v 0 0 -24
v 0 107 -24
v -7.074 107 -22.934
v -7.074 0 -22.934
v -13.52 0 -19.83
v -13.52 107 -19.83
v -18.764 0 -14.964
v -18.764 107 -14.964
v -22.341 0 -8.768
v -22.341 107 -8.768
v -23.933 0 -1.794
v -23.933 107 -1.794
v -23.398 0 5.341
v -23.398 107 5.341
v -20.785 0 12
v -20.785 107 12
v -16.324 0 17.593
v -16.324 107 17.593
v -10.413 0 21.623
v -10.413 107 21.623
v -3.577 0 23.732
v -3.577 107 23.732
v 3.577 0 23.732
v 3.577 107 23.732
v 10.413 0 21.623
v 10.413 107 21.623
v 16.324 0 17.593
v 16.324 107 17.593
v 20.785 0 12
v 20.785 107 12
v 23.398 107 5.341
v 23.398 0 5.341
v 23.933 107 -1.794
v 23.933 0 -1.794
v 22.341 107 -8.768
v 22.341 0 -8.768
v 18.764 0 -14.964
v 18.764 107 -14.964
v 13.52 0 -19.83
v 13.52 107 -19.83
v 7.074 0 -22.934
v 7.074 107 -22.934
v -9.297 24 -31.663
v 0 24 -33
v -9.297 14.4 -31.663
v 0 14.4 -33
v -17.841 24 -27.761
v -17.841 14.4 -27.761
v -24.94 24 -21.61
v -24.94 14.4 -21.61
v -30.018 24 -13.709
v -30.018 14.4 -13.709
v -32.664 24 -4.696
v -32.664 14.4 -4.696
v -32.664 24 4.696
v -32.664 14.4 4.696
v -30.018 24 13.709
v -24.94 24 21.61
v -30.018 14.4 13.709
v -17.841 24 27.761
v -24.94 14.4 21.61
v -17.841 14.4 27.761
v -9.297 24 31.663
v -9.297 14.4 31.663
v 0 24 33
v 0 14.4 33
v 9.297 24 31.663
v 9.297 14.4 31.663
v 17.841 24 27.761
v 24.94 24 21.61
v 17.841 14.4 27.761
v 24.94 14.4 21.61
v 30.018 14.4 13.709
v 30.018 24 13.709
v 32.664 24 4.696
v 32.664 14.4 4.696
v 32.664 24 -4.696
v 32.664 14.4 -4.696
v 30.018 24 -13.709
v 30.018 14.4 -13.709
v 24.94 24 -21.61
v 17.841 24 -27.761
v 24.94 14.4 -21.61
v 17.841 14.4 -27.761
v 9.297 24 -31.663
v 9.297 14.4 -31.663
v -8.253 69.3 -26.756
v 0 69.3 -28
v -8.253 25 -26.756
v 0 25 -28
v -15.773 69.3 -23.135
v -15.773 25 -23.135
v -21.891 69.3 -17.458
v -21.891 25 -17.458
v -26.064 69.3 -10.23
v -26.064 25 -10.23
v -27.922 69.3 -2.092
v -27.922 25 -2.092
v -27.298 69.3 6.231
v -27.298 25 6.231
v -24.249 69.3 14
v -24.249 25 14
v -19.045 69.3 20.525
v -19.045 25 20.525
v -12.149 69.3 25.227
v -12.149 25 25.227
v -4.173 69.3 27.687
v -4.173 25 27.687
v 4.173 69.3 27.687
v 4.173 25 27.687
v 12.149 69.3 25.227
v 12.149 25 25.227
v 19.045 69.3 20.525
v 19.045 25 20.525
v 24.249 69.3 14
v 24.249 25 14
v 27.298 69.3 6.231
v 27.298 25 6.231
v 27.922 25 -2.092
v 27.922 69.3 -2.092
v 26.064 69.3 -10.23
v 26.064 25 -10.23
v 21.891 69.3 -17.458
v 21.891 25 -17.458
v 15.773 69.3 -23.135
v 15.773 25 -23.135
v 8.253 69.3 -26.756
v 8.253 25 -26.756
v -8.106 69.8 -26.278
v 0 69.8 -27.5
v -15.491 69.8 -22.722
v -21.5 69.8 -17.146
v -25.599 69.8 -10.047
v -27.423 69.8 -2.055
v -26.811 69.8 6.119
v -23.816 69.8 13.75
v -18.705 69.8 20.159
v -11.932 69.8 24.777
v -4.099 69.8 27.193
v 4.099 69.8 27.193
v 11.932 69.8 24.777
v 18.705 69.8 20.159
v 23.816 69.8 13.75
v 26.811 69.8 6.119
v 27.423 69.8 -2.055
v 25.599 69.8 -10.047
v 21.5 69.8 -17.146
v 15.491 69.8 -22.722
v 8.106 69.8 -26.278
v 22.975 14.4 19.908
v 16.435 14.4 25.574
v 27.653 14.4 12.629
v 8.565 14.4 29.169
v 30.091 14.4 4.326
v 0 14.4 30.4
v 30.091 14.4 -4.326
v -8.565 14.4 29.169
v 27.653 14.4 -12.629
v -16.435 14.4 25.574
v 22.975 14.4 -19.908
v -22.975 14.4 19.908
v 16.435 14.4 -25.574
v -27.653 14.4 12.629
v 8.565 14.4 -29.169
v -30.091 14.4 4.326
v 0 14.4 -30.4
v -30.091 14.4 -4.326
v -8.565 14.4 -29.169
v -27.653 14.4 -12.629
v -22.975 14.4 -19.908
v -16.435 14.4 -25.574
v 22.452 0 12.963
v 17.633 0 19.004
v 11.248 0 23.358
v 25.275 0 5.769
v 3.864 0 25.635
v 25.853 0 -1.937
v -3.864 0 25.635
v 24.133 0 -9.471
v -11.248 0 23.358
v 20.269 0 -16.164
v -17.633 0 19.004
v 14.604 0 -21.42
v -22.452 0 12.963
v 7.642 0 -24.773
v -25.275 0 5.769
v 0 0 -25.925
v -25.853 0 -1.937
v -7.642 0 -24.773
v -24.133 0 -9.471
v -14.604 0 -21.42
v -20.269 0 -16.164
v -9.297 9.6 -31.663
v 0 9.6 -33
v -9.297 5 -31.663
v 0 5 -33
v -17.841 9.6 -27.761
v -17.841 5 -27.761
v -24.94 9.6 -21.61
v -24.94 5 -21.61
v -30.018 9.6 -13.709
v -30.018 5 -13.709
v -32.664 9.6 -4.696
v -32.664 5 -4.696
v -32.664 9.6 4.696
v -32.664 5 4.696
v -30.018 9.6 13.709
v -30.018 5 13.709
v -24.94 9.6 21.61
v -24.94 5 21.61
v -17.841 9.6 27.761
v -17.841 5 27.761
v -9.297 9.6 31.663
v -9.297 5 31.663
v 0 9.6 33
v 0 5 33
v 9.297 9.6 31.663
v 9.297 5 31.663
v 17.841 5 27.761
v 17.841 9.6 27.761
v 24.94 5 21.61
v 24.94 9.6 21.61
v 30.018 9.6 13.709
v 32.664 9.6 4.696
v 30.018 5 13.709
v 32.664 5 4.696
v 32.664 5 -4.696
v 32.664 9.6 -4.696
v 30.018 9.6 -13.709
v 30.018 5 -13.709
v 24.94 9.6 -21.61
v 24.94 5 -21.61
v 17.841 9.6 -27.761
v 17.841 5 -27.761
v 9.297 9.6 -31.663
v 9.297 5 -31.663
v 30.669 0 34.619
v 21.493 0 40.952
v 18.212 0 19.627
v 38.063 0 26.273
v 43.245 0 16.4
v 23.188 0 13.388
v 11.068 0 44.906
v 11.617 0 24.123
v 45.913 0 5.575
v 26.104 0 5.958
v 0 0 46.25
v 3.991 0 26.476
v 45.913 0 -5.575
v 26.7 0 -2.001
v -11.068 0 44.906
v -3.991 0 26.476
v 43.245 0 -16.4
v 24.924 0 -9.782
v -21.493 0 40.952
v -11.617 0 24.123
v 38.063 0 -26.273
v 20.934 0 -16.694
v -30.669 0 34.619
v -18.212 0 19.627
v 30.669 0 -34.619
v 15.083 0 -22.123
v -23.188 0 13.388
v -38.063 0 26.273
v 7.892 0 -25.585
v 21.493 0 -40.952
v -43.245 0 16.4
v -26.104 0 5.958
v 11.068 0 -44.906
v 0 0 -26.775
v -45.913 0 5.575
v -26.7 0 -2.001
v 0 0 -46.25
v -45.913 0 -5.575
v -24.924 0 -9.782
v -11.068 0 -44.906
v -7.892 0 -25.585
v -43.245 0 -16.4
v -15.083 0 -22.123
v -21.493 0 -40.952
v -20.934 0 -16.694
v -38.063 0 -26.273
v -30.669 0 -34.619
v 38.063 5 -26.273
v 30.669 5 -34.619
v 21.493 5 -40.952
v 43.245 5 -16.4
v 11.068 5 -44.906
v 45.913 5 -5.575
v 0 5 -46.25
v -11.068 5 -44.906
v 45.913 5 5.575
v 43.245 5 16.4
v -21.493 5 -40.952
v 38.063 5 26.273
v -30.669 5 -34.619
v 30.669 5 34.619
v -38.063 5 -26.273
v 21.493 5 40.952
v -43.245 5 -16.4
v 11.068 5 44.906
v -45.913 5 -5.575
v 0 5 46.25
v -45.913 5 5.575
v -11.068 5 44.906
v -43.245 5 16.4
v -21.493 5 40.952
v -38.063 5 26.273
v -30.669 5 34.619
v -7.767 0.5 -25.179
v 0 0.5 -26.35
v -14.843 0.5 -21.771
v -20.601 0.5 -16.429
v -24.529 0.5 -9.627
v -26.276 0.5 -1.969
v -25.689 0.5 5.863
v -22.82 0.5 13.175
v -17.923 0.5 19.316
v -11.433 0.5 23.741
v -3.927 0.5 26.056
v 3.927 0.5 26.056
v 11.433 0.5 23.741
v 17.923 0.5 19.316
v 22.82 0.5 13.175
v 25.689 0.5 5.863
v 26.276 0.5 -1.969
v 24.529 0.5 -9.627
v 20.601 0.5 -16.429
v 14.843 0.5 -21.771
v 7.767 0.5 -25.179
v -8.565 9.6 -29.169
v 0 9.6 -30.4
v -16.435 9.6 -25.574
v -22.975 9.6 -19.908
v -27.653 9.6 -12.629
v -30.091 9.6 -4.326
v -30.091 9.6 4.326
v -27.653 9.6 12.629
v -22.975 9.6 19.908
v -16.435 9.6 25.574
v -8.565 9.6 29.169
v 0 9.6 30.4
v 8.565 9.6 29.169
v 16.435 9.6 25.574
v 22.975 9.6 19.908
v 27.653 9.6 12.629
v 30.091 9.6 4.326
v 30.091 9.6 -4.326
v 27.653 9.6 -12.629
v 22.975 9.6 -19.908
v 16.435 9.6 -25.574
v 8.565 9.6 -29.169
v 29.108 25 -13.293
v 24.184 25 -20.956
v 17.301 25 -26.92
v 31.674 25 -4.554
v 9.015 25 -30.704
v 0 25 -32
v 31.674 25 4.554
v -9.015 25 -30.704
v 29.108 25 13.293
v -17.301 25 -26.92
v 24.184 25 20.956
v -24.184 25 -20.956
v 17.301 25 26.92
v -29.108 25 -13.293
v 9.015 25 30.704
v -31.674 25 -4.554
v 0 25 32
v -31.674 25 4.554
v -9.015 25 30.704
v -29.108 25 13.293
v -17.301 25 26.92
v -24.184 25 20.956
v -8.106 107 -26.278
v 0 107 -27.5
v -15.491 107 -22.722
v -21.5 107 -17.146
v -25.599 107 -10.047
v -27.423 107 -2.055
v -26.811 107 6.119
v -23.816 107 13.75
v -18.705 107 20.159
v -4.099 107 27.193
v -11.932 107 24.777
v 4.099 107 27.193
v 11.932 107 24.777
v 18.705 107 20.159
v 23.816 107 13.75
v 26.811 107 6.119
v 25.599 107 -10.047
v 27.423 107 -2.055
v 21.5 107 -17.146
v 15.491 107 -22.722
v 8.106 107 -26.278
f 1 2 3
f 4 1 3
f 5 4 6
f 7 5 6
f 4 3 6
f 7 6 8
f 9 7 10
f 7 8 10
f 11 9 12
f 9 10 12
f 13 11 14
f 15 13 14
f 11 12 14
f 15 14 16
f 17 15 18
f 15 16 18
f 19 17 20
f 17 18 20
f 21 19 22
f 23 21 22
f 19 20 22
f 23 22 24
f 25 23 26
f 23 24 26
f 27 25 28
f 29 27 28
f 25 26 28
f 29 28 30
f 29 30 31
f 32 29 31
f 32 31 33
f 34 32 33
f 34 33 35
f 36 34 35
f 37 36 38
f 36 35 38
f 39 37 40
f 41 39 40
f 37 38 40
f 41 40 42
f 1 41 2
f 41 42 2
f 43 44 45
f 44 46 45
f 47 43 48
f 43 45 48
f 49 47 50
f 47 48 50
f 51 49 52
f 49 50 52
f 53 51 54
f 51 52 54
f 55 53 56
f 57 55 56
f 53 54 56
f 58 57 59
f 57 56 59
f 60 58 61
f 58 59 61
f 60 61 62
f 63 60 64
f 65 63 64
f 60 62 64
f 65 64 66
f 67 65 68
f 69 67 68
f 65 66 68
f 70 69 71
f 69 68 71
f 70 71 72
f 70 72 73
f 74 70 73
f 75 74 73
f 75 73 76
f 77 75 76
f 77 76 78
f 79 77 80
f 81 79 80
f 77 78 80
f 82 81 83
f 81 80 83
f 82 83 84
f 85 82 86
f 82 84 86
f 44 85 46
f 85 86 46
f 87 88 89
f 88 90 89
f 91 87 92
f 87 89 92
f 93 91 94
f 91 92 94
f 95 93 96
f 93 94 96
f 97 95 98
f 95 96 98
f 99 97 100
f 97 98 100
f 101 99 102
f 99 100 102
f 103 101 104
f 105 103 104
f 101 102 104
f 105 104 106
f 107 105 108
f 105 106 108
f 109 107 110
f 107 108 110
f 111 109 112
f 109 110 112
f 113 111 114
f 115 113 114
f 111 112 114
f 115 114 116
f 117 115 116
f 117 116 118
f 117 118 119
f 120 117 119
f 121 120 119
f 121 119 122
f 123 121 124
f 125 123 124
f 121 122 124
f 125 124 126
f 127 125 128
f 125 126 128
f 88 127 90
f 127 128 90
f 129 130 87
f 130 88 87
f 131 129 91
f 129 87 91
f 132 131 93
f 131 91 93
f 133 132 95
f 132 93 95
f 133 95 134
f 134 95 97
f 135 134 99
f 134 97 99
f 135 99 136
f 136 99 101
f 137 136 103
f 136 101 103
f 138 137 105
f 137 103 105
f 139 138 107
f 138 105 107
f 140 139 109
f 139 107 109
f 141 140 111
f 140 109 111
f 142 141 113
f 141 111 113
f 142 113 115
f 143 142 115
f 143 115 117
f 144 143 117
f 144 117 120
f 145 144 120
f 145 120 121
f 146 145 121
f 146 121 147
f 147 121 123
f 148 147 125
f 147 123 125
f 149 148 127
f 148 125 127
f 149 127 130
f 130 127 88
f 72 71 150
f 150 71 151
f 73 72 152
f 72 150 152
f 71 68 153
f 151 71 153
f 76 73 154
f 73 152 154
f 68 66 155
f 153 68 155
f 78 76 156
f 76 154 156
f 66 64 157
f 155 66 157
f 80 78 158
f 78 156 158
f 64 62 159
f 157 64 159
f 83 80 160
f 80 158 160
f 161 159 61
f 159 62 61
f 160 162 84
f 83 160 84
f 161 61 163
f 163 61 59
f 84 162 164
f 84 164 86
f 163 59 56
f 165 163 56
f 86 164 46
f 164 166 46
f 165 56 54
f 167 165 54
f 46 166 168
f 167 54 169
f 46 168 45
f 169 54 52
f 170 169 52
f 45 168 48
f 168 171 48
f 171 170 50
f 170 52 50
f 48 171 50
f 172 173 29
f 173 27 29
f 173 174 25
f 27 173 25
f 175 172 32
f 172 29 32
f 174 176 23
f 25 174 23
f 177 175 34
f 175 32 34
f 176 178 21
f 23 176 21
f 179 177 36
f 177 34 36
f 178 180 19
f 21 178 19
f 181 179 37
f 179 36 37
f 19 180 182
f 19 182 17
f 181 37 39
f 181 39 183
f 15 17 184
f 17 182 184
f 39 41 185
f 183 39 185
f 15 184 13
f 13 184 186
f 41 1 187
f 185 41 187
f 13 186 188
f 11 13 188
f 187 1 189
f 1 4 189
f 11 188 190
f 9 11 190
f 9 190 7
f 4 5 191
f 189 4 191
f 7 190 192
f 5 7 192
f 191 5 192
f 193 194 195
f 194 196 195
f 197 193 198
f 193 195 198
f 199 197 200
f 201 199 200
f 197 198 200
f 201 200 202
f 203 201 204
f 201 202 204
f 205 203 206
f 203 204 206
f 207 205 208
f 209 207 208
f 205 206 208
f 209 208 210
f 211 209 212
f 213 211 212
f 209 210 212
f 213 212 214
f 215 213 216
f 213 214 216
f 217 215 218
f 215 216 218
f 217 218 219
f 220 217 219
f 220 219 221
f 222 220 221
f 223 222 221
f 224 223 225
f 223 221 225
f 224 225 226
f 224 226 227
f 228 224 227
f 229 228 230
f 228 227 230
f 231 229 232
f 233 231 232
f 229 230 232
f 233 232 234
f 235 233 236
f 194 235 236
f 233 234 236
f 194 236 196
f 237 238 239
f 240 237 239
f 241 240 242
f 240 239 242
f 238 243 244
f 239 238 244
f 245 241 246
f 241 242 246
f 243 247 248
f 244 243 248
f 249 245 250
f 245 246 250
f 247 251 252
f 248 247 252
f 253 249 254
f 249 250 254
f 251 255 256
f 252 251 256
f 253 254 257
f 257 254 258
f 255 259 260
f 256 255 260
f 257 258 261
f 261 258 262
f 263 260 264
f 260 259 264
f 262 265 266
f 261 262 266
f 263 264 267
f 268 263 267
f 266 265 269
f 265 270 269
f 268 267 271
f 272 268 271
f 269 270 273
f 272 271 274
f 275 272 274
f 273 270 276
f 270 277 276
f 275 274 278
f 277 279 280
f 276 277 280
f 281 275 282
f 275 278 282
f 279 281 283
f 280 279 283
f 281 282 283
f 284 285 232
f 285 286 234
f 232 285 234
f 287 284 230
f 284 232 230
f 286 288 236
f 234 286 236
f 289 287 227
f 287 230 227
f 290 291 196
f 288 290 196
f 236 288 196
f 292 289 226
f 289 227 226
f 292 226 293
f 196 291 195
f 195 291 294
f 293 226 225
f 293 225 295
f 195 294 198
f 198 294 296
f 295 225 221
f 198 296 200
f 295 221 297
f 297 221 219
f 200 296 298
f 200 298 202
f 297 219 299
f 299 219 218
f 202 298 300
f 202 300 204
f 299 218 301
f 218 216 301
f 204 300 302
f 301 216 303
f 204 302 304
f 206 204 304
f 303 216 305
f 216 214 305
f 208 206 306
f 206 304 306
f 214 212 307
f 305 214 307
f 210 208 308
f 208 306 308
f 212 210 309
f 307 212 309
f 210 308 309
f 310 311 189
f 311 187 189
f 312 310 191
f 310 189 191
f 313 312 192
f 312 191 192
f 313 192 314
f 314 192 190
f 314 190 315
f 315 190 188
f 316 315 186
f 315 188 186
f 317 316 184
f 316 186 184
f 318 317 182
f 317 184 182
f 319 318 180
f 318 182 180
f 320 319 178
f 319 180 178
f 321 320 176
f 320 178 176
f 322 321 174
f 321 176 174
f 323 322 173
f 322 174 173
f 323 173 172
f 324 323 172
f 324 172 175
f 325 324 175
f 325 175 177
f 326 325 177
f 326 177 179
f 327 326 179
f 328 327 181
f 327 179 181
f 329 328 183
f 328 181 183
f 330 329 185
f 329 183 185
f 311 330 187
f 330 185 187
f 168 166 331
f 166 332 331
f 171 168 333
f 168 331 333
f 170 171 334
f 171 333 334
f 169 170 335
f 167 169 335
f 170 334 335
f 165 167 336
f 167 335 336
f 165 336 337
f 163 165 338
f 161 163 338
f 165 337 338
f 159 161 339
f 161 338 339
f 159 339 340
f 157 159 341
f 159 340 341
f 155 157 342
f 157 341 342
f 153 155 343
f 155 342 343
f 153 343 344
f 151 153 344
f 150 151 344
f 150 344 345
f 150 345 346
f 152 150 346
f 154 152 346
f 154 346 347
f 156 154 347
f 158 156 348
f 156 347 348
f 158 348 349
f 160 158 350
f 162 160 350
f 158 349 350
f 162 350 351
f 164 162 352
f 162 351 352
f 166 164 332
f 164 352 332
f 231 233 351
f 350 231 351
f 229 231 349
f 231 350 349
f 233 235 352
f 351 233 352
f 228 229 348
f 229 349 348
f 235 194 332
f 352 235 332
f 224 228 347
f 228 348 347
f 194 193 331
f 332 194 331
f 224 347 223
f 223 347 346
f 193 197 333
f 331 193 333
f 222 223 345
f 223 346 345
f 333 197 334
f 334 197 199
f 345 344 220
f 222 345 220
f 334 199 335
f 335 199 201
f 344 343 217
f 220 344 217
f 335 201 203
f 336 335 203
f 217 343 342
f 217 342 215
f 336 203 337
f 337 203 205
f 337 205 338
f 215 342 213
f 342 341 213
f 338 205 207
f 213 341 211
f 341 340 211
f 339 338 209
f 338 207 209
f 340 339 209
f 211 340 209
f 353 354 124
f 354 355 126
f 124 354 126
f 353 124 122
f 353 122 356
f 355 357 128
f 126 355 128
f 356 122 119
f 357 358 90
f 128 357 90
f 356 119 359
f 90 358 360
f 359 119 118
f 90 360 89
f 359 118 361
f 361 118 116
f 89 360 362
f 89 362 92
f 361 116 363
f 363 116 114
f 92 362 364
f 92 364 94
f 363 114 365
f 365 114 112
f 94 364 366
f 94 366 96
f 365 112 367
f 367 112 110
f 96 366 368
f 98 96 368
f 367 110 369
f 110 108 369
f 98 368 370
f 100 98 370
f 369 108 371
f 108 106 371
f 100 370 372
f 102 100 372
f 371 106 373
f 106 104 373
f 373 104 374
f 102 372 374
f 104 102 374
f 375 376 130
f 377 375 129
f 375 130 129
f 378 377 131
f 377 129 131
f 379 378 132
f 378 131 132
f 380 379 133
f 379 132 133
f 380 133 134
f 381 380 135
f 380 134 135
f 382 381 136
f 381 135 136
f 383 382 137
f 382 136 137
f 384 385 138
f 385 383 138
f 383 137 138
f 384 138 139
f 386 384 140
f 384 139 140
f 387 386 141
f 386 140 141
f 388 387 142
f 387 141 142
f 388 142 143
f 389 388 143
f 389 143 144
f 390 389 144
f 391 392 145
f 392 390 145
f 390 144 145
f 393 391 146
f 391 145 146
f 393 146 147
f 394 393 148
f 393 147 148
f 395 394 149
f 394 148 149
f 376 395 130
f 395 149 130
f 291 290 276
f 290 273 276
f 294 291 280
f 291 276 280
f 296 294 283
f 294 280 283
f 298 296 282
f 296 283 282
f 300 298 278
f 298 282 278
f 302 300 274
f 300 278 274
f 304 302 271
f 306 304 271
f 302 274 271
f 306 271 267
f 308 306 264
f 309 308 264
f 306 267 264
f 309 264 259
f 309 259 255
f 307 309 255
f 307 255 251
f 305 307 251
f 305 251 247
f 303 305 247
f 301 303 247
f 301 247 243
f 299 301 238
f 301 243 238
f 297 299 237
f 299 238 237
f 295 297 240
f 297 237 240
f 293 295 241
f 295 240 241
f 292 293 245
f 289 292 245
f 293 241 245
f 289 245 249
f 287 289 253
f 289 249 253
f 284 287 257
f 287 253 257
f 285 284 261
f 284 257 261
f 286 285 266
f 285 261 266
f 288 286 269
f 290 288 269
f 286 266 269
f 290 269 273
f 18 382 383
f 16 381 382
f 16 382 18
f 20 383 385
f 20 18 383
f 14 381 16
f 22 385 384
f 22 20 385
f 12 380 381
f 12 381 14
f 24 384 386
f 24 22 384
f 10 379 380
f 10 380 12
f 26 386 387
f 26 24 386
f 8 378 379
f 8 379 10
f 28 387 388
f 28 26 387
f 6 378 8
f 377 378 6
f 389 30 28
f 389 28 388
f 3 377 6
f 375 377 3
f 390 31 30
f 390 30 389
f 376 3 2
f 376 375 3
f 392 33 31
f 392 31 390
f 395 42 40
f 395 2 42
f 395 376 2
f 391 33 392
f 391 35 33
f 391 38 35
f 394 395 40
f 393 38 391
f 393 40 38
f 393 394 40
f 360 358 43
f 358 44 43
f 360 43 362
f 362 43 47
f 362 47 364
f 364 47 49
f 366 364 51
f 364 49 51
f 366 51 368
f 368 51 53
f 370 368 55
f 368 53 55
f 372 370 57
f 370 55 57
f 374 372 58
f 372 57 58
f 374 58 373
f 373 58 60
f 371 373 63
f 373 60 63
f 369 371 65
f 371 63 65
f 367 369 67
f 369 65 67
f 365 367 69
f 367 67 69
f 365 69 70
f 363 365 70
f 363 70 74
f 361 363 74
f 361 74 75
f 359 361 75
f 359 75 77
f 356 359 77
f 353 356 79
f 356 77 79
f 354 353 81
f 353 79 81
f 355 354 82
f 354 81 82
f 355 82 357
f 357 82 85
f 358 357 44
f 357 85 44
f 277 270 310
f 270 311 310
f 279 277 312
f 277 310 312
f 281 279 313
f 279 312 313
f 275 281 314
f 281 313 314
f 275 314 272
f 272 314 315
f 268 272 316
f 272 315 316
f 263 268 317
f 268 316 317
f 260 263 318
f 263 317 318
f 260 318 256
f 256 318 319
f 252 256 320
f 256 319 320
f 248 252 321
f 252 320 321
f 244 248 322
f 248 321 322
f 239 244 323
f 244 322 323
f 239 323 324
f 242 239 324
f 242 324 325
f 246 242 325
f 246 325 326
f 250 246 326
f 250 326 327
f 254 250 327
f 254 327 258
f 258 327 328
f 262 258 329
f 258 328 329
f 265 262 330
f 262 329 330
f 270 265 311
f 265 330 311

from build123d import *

# Parameters (mm, degrees)
SKETCH2_R          = 37.5
CUT_EXTRUDE1_DEPTH = 47


with BuildPart() as part:
    # Sketch1 → Revolve1 (revolve)
    with BuildSketch(Plane.XY, mode=Mode.PRIVATE) as revolve1_sk:
        Polygon((24, 154), (27.5, 154), (27.5, 69.8), (28, 69.3), (28, 25), (32, 25), (33, 24), (33, 14.4), (30.4, 14.4), (30.4, 9.6), (33, 9.6), (33, 5), (46.25, 5), (46.25, 0), (26.775, 0), (26.35, 0.5), (25.925, 0), (24, 0), align=None)
    revolve(revolve1_sk.sketch.rotate(Axis((0, 0, 0), (0, 1, 0)), 90), axis=Axis((0, 0, 0), (0, 1, 0)))

    # Sketch2 → Cut-Extrude1 (cut)
    with BuildSketch(Plane(origin=(0, 154, 0), x_dir=(1, 0, 0), z_dir=(0, 1, 0))):
        Circle(SKETCH2_R)
    extrude(amount=-CUT_EXTRUDE1_DEPTH, mode=Mode.SUBTRACT)


solid = part.part
